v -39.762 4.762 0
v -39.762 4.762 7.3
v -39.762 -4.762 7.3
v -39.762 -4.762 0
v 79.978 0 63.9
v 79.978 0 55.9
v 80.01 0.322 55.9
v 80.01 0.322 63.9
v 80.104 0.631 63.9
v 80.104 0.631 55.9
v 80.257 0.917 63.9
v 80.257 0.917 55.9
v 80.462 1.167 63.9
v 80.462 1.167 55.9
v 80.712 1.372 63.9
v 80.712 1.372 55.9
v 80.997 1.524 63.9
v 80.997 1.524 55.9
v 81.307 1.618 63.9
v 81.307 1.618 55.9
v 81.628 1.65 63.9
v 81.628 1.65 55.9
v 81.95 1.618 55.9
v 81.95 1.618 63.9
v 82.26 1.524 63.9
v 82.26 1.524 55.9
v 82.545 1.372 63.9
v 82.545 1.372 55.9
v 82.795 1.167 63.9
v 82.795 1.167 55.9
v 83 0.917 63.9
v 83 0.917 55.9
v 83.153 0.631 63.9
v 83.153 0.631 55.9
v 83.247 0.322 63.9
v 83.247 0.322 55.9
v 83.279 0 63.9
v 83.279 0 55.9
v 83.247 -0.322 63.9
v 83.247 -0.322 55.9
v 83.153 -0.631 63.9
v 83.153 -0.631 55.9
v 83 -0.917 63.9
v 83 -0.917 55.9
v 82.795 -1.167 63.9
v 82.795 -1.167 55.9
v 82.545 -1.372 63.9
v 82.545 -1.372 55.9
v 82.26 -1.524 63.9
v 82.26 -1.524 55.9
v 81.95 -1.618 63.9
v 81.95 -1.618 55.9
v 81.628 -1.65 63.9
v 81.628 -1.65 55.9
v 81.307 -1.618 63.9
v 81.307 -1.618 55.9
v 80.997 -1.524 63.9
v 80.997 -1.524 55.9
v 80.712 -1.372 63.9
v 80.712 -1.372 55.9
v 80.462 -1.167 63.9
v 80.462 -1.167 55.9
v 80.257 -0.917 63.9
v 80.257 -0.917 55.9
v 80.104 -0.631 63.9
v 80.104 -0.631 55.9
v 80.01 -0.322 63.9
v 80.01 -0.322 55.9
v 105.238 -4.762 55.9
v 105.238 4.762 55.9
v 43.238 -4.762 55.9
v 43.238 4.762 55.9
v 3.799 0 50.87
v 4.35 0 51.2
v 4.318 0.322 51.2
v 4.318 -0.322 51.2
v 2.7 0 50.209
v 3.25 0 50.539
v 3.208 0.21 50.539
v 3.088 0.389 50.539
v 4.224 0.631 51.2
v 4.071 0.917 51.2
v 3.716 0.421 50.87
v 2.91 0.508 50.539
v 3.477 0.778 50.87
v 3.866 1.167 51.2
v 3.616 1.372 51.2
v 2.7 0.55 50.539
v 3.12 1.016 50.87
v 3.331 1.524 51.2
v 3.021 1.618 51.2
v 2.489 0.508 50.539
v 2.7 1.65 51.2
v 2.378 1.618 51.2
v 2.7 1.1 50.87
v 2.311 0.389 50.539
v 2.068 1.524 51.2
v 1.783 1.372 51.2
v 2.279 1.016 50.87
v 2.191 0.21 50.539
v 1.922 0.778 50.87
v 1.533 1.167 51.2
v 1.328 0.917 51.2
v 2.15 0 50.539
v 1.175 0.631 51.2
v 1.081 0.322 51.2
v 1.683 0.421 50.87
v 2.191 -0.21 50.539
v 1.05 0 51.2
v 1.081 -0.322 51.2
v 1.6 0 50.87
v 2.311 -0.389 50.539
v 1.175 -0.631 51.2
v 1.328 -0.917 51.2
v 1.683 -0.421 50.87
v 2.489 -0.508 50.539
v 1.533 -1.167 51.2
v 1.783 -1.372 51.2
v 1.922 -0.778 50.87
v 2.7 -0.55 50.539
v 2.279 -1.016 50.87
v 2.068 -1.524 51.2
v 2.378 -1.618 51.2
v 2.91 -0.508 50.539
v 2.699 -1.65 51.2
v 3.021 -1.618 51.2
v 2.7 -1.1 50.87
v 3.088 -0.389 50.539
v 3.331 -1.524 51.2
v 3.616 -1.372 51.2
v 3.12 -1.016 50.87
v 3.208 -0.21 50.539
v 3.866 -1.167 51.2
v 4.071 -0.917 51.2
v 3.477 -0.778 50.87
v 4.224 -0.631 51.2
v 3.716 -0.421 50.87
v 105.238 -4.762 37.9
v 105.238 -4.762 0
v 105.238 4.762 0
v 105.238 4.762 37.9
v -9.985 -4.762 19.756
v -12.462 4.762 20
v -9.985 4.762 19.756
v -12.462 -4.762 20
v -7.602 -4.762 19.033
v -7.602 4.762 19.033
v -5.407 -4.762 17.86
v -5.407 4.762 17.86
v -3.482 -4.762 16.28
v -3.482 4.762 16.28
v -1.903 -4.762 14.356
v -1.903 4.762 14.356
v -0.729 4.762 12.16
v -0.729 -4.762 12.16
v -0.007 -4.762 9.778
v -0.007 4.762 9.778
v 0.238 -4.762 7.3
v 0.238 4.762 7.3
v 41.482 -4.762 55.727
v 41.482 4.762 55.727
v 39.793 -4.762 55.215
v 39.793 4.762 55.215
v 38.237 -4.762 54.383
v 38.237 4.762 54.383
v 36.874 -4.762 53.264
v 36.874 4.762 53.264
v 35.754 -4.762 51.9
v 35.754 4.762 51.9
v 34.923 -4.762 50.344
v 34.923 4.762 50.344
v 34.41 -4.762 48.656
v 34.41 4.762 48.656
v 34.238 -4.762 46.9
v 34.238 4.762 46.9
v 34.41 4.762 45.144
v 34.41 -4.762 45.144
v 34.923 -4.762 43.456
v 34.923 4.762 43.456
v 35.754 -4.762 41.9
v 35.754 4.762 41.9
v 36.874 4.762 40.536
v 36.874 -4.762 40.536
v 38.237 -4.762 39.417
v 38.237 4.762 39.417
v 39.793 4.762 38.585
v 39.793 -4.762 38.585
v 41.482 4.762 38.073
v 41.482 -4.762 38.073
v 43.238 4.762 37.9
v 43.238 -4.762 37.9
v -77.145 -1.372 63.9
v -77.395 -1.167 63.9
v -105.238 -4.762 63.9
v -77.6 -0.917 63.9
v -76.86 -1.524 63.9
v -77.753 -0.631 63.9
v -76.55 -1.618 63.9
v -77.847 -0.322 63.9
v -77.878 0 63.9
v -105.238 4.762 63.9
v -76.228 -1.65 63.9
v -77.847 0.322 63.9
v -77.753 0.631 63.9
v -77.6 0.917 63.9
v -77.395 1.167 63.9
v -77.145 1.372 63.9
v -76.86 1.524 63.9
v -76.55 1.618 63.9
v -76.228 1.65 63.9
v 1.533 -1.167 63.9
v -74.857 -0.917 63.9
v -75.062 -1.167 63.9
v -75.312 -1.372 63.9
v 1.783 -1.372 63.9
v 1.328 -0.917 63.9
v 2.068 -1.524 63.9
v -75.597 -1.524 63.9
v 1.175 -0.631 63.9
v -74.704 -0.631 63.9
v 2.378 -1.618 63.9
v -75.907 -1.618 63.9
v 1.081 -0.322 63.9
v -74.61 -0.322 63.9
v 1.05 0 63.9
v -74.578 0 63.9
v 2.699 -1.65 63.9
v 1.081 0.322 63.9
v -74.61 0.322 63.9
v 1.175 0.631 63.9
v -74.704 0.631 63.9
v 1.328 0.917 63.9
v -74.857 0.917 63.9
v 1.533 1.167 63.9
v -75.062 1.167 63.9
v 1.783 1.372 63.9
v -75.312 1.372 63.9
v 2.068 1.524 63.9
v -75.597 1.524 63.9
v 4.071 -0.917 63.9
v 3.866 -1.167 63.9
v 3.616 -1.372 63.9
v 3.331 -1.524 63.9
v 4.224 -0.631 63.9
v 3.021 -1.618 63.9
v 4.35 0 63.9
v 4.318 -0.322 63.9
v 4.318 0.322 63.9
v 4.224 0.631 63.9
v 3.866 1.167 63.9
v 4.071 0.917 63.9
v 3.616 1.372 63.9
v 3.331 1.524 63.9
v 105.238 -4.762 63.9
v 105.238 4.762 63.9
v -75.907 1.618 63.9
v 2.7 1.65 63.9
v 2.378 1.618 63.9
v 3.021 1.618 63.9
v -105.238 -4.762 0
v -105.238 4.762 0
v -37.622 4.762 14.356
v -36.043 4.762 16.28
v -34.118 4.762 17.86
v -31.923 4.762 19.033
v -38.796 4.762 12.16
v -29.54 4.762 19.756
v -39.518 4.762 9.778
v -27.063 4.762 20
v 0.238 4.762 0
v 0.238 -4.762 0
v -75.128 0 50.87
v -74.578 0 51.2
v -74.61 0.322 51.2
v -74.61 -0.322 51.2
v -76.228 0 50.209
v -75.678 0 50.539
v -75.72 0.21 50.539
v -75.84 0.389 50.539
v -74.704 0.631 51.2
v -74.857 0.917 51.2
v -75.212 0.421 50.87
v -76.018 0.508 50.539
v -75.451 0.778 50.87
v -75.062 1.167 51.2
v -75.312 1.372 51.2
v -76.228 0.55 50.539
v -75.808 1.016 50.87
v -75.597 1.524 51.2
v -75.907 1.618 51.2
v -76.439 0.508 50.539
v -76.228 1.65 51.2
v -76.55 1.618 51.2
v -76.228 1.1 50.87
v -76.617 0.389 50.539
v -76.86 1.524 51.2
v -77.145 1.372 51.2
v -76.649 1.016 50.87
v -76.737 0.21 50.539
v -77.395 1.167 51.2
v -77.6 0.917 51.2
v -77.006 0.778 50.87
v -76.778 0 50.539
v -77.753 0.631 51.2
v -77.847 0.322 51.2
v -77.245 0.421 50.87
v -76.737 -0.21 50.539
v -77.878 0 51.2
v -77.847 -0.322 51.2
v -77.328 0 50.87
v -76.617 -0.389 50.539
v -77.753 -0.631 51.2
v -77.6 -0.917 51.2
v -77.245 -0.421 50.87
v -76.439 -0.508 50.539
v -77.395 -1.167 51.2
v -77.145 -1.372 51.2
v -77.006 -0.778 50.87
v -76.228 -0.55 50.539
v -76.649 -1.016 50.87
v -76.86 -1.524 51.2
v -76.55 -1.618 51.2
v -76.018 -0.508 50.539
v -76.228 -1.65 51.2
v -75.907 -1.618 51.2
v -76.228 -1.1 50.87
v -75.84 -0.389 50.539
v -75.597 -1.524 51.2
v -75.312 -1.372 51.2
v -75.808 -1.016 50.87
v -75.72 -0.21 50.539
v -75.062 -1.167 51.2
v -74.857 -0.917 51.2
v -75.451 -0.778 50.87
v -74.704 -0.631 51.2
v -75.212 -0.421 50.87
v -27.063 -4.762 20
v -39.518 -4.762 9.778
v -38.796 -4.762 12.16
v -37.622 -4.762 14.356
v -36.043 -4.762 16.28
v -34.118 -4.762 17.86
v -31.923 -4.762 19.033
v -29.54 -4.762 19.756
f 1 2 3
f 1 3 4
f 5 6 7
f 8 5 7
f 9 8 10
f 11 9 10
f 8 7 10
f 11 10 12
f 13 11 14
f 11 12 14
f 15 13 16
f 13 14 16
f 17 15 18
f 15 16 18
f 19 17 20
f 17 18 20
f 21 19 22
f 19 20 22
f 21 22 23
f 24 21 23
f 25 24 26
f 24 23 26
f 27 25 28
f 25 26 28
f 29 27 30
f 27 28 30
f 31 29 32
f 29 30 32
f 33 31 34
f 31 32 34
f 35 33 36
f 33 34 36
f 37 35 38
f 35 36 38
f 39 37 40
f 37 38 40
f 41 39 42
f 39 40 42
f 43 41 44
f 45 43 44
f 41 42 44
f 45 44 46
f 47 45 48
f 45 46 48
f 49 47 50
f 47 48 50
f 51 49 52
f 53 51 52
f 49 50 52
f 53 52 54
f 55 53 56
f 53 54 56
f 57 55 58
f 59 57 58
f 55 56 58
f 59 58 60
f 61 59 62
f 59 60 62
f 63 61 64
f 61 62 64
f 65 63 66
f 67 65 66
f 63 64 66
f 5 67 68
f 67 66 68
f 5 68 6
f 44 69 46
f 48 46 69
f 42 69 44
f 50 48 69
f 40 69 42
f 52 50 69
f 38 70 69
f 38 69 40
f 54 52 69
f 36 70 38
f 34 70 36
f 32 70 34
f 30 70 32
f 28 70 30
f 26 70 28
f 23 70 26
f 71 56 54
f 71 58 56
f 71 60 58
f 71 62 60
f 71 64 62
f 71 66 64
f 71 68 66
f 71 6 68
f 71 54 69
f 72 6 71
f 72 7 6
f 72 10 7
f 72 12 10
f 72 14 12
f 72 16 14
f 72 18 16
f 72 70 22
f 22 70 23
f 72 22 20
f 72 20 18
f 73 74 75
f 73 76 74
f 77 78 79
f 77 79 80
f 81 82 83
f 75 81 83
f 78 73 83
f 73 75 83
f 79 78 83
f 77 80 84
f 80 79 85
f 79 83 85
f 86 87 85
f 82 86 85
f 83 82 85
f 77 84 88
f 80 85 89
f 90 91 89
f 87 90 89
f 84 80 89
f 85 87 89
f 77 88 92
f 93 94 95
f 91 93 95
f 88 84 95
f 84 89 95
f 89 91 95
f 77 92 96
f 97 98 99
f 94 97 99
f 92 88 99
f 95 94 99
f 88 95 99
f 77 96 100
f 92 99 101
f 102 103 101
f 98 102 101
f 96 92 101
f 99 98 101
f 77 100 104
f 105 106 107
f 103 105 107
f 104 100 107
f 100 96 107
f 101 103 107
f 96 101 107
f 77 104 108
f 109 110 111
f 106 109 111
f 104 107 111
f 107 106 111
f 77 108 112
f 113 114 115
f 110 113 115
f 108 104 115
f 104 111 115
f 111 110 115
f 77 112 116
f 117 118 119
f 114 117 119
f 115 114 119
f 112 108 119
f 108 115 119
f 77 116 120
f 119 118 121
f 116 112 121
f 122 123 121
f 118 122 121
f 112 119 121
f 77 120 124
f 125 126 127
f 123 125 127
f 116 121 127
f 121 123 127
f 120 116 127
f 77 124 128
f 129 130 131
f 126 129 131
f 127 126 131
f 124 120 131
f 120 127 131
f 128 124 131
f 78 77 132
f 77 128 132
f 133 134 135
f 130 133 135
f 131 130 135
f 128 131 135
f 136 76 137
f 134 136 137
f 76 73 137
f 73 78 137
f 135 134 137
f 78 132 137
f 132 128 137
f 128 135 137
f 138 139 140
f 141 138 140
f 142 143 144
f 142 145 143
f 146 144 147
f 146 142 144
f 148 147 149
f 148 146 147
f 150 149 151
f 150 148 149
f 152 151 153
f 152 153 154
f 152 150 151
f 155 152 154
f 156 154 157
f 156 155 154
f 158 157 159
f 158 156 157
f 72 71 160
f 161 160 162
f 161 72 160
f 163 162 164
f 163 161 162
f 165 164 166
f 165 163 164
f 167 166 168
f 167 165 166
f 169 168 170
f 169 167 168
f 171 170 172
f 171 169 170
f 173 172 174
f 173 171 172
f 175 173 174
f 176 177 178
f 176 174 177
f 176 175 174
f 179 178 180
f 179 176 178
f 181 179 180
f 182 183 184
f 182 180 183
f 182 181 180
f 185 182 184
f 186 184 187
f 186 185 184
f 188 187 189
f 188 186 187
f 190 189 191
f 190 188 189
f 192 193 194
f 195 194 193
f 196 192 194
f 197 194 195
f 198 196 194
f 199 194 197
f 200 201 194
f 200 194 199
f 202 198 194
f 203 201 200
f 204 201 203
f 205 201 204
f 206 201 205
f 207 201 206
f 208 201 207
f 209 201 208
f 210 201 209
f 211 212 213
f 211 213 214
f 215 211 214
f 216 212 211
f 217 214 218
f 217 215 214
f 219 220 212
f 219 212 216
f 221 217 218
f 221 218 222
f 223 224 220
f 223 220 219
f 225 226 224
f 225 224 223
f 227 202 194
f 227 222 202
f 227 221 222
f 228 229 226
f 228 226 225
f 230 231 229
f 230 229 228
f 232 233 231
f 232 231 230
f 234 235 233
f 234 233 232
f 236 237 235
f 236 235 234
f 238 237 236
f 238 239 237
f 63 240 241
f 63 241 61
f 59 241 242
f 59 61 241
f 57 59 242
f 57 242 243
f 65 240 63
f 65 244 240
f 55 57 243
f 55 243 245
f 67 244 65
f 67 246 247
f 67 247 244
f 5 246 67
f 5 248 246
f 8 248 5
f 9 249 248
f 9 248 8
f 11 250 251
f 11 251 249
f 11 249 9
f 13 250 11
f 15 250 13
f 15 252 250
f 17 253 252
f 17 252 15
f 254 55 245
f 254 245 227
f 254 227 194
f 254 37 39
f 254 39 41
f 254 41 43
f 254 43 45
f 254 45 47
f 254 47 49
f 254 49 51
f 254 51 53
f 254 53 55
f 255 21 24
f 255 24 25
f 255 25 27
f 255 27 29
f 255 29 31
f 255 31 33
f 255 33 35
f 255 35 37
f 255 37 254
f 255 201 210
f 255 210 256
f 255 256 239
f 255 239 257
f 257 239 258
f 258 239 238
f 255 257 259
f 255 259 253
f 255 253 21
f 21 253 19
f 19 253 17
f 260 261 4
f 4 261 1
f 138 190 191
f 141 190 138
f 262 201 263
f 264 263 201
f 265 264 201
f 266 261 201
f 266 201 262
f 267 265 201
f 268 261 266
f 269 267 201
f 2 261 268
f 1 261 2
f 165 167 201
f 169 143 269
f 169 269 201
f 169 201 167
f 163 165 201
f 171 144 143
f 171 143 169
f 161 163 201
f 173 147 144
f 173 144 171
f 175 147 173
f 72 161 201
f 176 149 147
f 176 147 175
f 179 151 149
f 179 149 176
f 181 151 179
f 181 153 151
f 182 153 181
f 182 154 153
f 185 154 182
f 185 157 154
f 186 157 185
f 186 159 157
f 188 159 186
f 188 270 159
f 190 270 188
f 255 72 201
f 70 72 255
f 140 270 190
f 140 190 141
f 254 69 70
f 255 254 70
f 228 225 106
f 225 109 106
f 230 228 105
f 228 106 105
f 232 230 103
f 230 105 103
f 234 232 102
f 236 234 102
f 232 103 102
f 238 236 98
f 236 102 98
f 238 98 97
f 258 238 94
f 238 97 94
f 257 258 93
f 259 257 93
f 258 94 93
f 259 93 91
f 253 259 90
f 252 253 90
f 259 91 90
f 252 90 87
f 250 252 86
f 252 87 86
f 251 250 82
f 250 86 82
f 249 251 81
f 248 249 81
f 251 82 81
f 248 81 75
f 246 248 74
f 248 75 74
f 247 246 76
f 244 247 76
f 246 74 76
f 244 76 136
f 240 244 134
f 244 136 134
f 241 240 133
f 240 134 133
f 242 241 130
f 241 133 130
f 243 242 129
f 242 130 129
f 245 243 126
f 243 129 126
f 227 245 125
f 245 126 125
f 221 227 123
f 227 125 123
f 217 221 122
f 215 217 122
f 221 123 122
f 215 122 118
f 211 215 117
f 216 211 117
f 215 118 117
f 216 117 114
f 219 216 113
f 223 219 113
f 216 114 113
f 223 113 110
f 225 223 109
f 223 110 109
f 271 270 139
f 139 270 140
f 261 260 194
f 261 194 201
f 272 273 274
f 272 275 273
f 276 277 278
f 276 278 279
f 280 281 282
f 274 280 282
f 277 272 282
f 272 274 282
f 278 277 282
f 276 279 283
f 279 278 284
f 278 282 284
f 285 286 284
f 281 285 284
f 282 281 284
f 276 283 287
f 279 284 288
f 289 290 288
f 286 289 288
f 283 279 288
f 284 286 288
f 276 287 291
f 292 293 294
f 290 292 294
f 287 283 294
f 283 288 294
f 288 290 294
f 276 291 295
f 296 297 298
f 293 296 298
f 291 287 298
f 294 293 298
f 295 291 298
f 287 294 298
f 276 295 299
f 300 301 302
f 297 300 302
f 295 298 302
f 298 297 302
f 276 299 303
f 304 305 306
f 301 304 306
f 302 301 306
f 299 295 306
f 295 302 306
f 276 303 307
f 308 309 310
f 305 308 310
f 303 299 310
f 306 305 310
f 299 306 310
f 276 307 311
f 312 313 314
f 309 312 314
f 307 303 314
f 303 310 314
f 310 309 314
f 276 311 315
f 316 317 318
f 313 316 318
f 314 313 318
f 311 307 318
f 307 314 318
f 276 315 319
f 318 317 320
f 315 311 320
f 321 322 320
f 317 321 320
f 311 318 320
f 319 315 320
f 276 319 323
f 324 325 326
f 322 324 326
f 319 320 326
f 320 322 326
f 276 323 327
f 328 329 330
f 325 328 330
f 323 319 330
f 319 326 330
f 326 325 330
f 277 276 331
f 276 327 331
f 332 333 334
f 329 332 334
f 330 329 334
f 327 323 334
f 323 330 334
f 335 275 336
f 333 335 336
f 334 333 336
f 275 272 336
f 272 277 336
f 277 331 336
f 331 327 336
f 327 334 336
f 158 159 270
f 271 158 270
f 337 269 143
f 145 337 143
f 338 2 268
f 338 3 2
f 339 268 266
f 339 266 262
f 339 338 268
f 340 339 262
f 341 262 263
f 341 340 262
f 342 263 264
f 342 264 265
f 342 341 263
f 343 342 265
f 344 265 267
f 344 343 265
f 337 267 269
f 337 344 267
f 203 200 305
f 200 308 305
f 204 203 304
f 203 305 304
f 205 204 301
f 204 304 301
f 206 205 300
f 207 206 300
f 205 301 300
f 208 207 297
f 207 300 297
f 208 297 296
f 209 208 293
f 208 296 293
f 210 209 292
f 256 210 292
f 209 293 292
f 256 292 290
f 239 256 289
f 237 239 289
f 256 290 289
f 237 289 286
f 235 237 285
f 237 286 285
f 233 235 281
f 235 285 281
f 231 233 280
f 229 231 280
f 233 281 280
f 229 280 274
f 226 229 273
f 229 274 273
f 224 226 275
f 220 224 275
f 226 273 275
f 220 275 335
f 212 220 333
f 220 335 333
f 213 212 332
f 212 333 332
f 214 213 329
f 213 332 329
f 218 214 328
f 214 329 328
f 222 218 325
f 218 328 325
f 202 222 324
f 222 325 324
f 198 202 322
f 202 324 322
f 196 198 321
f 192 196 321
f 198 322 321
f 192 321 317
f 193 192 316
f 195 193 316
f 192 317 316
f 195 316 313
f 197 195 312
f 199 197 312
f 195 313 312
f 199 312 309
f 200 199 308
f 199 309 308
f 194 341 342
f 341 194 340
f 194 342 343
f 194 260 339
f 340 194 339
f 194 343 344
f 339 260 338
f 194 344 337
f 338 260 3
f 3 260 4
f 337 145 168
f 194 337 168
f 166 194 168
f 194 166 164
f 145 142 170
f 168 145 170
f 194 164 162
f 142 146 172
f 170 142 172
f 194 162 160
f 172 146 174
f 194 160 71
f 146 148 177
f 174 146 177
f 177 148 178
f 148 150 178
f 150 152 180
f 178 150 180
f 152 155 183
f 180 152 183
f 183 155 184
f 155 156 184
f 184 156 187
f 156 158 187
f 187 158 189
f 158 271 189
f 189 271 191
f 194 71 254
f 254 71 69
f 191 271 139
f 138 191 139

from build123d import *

# Parameters (mm, degrees)
SKETCH1_W                   = 210.475
SKETCH1_H                   = 9.525
BOSS_EXTRUDE1_DEPTH         = 63.9
SKETCH2_W                   = 40
SKETCH2_H                   = 20
CUT_EXTRUDE1_DEPTH          = 10.525
FILLET1_R                   = 12.7
TAP_DRILL_FOR_M4_TAP1_D     = 3.3
TAP_DRILL_FOR_M4_TAP1_DEPTH = 12.7
TAP_DRILL_FOR_M4_TAP1_TIP   = 0.991420021
CUT_EXTRUDE2_DEPTH          = 10.525


with BuildPart() as part:
    # Sketch1 → Boss-Extrude1 (new body)
    with BuildSketch(Plane.XY):
        Rectangle(SKETCH1_W, SKETCH1_H)
    extrude(amount=BOSS_EXTRUDE1_DEPTH)

    # Sketch2 → Cut-Extrude1 (cut, through all)
    with BuildSketch(Plane(origin=(0, 4.7625, 0), x_dir=(1, 0, 0), z_dir=(0, 1, 0))):
        with Locations((-19.7625, -10)):
            Rectangle(SKETCH2_W, SKETCH2_H)
    extrude(amount=-CUT_EXTRUDE1_DEPTH, mode=Mode.SUBTRACT)

    # Fillet1
    fillet1_edges = [part.edges().sort_by_distance(p)[0] for p in [
        (-39.7625, 0, 20),
        (0.2375, 0, 20),
    ]]
    fillet(fillet1_edges, radius=FILLET1_R)

    # Tap Drill for M4 Tap1
    with Locations(Plane.XY.offset(63.9)):
        with Locations((-76.2285, 0), (2.6995, 0), (81.6285, 0)):
            Hole(TAP_DRILL_FOR_M4_TAP1_D / 2, depth=TAP_DRILL_FOR_M4_TAP1_DEPTH)
            with Locations((0, 0, -(TAP_DRILL_FOR_M4_TAP1_DEPTH + TAP_DRILL_FOR_M4_TAP1_TIP / 2))):  # 118° drill point
                Cone(0, TAP_DRILL_FOR_M4_TAP1_D / 2, TAP_DRILL_FOR_M4_TAP1_TIP, mode=Mode.SUBTRACT)

    # Sketch7 → Cut-Extrude2 (cut, through all)
    with BuildSketch(Plane(origin=(0, 4.7625, 0), x_dir=(1, 0, 0), z_dir=(0, 1, 0))):
        with BuildLine():
            Line((43.2375, -37.9), (105.2375, -37.9))
            Line((105.2375, -37.9), (105.2375, -55.9))
            Line((105.2375, -55.9), (43.2375, -55.9))
            ThreePointArc((43.2375, -55.9), (34.2375, -46.9), (43.2375, -37.9))
        make_face()
    extrude(amount=-CUT_EXTRUDE2_DEPTH, mode=Mode.SUBTRACT)


solid = part.part
